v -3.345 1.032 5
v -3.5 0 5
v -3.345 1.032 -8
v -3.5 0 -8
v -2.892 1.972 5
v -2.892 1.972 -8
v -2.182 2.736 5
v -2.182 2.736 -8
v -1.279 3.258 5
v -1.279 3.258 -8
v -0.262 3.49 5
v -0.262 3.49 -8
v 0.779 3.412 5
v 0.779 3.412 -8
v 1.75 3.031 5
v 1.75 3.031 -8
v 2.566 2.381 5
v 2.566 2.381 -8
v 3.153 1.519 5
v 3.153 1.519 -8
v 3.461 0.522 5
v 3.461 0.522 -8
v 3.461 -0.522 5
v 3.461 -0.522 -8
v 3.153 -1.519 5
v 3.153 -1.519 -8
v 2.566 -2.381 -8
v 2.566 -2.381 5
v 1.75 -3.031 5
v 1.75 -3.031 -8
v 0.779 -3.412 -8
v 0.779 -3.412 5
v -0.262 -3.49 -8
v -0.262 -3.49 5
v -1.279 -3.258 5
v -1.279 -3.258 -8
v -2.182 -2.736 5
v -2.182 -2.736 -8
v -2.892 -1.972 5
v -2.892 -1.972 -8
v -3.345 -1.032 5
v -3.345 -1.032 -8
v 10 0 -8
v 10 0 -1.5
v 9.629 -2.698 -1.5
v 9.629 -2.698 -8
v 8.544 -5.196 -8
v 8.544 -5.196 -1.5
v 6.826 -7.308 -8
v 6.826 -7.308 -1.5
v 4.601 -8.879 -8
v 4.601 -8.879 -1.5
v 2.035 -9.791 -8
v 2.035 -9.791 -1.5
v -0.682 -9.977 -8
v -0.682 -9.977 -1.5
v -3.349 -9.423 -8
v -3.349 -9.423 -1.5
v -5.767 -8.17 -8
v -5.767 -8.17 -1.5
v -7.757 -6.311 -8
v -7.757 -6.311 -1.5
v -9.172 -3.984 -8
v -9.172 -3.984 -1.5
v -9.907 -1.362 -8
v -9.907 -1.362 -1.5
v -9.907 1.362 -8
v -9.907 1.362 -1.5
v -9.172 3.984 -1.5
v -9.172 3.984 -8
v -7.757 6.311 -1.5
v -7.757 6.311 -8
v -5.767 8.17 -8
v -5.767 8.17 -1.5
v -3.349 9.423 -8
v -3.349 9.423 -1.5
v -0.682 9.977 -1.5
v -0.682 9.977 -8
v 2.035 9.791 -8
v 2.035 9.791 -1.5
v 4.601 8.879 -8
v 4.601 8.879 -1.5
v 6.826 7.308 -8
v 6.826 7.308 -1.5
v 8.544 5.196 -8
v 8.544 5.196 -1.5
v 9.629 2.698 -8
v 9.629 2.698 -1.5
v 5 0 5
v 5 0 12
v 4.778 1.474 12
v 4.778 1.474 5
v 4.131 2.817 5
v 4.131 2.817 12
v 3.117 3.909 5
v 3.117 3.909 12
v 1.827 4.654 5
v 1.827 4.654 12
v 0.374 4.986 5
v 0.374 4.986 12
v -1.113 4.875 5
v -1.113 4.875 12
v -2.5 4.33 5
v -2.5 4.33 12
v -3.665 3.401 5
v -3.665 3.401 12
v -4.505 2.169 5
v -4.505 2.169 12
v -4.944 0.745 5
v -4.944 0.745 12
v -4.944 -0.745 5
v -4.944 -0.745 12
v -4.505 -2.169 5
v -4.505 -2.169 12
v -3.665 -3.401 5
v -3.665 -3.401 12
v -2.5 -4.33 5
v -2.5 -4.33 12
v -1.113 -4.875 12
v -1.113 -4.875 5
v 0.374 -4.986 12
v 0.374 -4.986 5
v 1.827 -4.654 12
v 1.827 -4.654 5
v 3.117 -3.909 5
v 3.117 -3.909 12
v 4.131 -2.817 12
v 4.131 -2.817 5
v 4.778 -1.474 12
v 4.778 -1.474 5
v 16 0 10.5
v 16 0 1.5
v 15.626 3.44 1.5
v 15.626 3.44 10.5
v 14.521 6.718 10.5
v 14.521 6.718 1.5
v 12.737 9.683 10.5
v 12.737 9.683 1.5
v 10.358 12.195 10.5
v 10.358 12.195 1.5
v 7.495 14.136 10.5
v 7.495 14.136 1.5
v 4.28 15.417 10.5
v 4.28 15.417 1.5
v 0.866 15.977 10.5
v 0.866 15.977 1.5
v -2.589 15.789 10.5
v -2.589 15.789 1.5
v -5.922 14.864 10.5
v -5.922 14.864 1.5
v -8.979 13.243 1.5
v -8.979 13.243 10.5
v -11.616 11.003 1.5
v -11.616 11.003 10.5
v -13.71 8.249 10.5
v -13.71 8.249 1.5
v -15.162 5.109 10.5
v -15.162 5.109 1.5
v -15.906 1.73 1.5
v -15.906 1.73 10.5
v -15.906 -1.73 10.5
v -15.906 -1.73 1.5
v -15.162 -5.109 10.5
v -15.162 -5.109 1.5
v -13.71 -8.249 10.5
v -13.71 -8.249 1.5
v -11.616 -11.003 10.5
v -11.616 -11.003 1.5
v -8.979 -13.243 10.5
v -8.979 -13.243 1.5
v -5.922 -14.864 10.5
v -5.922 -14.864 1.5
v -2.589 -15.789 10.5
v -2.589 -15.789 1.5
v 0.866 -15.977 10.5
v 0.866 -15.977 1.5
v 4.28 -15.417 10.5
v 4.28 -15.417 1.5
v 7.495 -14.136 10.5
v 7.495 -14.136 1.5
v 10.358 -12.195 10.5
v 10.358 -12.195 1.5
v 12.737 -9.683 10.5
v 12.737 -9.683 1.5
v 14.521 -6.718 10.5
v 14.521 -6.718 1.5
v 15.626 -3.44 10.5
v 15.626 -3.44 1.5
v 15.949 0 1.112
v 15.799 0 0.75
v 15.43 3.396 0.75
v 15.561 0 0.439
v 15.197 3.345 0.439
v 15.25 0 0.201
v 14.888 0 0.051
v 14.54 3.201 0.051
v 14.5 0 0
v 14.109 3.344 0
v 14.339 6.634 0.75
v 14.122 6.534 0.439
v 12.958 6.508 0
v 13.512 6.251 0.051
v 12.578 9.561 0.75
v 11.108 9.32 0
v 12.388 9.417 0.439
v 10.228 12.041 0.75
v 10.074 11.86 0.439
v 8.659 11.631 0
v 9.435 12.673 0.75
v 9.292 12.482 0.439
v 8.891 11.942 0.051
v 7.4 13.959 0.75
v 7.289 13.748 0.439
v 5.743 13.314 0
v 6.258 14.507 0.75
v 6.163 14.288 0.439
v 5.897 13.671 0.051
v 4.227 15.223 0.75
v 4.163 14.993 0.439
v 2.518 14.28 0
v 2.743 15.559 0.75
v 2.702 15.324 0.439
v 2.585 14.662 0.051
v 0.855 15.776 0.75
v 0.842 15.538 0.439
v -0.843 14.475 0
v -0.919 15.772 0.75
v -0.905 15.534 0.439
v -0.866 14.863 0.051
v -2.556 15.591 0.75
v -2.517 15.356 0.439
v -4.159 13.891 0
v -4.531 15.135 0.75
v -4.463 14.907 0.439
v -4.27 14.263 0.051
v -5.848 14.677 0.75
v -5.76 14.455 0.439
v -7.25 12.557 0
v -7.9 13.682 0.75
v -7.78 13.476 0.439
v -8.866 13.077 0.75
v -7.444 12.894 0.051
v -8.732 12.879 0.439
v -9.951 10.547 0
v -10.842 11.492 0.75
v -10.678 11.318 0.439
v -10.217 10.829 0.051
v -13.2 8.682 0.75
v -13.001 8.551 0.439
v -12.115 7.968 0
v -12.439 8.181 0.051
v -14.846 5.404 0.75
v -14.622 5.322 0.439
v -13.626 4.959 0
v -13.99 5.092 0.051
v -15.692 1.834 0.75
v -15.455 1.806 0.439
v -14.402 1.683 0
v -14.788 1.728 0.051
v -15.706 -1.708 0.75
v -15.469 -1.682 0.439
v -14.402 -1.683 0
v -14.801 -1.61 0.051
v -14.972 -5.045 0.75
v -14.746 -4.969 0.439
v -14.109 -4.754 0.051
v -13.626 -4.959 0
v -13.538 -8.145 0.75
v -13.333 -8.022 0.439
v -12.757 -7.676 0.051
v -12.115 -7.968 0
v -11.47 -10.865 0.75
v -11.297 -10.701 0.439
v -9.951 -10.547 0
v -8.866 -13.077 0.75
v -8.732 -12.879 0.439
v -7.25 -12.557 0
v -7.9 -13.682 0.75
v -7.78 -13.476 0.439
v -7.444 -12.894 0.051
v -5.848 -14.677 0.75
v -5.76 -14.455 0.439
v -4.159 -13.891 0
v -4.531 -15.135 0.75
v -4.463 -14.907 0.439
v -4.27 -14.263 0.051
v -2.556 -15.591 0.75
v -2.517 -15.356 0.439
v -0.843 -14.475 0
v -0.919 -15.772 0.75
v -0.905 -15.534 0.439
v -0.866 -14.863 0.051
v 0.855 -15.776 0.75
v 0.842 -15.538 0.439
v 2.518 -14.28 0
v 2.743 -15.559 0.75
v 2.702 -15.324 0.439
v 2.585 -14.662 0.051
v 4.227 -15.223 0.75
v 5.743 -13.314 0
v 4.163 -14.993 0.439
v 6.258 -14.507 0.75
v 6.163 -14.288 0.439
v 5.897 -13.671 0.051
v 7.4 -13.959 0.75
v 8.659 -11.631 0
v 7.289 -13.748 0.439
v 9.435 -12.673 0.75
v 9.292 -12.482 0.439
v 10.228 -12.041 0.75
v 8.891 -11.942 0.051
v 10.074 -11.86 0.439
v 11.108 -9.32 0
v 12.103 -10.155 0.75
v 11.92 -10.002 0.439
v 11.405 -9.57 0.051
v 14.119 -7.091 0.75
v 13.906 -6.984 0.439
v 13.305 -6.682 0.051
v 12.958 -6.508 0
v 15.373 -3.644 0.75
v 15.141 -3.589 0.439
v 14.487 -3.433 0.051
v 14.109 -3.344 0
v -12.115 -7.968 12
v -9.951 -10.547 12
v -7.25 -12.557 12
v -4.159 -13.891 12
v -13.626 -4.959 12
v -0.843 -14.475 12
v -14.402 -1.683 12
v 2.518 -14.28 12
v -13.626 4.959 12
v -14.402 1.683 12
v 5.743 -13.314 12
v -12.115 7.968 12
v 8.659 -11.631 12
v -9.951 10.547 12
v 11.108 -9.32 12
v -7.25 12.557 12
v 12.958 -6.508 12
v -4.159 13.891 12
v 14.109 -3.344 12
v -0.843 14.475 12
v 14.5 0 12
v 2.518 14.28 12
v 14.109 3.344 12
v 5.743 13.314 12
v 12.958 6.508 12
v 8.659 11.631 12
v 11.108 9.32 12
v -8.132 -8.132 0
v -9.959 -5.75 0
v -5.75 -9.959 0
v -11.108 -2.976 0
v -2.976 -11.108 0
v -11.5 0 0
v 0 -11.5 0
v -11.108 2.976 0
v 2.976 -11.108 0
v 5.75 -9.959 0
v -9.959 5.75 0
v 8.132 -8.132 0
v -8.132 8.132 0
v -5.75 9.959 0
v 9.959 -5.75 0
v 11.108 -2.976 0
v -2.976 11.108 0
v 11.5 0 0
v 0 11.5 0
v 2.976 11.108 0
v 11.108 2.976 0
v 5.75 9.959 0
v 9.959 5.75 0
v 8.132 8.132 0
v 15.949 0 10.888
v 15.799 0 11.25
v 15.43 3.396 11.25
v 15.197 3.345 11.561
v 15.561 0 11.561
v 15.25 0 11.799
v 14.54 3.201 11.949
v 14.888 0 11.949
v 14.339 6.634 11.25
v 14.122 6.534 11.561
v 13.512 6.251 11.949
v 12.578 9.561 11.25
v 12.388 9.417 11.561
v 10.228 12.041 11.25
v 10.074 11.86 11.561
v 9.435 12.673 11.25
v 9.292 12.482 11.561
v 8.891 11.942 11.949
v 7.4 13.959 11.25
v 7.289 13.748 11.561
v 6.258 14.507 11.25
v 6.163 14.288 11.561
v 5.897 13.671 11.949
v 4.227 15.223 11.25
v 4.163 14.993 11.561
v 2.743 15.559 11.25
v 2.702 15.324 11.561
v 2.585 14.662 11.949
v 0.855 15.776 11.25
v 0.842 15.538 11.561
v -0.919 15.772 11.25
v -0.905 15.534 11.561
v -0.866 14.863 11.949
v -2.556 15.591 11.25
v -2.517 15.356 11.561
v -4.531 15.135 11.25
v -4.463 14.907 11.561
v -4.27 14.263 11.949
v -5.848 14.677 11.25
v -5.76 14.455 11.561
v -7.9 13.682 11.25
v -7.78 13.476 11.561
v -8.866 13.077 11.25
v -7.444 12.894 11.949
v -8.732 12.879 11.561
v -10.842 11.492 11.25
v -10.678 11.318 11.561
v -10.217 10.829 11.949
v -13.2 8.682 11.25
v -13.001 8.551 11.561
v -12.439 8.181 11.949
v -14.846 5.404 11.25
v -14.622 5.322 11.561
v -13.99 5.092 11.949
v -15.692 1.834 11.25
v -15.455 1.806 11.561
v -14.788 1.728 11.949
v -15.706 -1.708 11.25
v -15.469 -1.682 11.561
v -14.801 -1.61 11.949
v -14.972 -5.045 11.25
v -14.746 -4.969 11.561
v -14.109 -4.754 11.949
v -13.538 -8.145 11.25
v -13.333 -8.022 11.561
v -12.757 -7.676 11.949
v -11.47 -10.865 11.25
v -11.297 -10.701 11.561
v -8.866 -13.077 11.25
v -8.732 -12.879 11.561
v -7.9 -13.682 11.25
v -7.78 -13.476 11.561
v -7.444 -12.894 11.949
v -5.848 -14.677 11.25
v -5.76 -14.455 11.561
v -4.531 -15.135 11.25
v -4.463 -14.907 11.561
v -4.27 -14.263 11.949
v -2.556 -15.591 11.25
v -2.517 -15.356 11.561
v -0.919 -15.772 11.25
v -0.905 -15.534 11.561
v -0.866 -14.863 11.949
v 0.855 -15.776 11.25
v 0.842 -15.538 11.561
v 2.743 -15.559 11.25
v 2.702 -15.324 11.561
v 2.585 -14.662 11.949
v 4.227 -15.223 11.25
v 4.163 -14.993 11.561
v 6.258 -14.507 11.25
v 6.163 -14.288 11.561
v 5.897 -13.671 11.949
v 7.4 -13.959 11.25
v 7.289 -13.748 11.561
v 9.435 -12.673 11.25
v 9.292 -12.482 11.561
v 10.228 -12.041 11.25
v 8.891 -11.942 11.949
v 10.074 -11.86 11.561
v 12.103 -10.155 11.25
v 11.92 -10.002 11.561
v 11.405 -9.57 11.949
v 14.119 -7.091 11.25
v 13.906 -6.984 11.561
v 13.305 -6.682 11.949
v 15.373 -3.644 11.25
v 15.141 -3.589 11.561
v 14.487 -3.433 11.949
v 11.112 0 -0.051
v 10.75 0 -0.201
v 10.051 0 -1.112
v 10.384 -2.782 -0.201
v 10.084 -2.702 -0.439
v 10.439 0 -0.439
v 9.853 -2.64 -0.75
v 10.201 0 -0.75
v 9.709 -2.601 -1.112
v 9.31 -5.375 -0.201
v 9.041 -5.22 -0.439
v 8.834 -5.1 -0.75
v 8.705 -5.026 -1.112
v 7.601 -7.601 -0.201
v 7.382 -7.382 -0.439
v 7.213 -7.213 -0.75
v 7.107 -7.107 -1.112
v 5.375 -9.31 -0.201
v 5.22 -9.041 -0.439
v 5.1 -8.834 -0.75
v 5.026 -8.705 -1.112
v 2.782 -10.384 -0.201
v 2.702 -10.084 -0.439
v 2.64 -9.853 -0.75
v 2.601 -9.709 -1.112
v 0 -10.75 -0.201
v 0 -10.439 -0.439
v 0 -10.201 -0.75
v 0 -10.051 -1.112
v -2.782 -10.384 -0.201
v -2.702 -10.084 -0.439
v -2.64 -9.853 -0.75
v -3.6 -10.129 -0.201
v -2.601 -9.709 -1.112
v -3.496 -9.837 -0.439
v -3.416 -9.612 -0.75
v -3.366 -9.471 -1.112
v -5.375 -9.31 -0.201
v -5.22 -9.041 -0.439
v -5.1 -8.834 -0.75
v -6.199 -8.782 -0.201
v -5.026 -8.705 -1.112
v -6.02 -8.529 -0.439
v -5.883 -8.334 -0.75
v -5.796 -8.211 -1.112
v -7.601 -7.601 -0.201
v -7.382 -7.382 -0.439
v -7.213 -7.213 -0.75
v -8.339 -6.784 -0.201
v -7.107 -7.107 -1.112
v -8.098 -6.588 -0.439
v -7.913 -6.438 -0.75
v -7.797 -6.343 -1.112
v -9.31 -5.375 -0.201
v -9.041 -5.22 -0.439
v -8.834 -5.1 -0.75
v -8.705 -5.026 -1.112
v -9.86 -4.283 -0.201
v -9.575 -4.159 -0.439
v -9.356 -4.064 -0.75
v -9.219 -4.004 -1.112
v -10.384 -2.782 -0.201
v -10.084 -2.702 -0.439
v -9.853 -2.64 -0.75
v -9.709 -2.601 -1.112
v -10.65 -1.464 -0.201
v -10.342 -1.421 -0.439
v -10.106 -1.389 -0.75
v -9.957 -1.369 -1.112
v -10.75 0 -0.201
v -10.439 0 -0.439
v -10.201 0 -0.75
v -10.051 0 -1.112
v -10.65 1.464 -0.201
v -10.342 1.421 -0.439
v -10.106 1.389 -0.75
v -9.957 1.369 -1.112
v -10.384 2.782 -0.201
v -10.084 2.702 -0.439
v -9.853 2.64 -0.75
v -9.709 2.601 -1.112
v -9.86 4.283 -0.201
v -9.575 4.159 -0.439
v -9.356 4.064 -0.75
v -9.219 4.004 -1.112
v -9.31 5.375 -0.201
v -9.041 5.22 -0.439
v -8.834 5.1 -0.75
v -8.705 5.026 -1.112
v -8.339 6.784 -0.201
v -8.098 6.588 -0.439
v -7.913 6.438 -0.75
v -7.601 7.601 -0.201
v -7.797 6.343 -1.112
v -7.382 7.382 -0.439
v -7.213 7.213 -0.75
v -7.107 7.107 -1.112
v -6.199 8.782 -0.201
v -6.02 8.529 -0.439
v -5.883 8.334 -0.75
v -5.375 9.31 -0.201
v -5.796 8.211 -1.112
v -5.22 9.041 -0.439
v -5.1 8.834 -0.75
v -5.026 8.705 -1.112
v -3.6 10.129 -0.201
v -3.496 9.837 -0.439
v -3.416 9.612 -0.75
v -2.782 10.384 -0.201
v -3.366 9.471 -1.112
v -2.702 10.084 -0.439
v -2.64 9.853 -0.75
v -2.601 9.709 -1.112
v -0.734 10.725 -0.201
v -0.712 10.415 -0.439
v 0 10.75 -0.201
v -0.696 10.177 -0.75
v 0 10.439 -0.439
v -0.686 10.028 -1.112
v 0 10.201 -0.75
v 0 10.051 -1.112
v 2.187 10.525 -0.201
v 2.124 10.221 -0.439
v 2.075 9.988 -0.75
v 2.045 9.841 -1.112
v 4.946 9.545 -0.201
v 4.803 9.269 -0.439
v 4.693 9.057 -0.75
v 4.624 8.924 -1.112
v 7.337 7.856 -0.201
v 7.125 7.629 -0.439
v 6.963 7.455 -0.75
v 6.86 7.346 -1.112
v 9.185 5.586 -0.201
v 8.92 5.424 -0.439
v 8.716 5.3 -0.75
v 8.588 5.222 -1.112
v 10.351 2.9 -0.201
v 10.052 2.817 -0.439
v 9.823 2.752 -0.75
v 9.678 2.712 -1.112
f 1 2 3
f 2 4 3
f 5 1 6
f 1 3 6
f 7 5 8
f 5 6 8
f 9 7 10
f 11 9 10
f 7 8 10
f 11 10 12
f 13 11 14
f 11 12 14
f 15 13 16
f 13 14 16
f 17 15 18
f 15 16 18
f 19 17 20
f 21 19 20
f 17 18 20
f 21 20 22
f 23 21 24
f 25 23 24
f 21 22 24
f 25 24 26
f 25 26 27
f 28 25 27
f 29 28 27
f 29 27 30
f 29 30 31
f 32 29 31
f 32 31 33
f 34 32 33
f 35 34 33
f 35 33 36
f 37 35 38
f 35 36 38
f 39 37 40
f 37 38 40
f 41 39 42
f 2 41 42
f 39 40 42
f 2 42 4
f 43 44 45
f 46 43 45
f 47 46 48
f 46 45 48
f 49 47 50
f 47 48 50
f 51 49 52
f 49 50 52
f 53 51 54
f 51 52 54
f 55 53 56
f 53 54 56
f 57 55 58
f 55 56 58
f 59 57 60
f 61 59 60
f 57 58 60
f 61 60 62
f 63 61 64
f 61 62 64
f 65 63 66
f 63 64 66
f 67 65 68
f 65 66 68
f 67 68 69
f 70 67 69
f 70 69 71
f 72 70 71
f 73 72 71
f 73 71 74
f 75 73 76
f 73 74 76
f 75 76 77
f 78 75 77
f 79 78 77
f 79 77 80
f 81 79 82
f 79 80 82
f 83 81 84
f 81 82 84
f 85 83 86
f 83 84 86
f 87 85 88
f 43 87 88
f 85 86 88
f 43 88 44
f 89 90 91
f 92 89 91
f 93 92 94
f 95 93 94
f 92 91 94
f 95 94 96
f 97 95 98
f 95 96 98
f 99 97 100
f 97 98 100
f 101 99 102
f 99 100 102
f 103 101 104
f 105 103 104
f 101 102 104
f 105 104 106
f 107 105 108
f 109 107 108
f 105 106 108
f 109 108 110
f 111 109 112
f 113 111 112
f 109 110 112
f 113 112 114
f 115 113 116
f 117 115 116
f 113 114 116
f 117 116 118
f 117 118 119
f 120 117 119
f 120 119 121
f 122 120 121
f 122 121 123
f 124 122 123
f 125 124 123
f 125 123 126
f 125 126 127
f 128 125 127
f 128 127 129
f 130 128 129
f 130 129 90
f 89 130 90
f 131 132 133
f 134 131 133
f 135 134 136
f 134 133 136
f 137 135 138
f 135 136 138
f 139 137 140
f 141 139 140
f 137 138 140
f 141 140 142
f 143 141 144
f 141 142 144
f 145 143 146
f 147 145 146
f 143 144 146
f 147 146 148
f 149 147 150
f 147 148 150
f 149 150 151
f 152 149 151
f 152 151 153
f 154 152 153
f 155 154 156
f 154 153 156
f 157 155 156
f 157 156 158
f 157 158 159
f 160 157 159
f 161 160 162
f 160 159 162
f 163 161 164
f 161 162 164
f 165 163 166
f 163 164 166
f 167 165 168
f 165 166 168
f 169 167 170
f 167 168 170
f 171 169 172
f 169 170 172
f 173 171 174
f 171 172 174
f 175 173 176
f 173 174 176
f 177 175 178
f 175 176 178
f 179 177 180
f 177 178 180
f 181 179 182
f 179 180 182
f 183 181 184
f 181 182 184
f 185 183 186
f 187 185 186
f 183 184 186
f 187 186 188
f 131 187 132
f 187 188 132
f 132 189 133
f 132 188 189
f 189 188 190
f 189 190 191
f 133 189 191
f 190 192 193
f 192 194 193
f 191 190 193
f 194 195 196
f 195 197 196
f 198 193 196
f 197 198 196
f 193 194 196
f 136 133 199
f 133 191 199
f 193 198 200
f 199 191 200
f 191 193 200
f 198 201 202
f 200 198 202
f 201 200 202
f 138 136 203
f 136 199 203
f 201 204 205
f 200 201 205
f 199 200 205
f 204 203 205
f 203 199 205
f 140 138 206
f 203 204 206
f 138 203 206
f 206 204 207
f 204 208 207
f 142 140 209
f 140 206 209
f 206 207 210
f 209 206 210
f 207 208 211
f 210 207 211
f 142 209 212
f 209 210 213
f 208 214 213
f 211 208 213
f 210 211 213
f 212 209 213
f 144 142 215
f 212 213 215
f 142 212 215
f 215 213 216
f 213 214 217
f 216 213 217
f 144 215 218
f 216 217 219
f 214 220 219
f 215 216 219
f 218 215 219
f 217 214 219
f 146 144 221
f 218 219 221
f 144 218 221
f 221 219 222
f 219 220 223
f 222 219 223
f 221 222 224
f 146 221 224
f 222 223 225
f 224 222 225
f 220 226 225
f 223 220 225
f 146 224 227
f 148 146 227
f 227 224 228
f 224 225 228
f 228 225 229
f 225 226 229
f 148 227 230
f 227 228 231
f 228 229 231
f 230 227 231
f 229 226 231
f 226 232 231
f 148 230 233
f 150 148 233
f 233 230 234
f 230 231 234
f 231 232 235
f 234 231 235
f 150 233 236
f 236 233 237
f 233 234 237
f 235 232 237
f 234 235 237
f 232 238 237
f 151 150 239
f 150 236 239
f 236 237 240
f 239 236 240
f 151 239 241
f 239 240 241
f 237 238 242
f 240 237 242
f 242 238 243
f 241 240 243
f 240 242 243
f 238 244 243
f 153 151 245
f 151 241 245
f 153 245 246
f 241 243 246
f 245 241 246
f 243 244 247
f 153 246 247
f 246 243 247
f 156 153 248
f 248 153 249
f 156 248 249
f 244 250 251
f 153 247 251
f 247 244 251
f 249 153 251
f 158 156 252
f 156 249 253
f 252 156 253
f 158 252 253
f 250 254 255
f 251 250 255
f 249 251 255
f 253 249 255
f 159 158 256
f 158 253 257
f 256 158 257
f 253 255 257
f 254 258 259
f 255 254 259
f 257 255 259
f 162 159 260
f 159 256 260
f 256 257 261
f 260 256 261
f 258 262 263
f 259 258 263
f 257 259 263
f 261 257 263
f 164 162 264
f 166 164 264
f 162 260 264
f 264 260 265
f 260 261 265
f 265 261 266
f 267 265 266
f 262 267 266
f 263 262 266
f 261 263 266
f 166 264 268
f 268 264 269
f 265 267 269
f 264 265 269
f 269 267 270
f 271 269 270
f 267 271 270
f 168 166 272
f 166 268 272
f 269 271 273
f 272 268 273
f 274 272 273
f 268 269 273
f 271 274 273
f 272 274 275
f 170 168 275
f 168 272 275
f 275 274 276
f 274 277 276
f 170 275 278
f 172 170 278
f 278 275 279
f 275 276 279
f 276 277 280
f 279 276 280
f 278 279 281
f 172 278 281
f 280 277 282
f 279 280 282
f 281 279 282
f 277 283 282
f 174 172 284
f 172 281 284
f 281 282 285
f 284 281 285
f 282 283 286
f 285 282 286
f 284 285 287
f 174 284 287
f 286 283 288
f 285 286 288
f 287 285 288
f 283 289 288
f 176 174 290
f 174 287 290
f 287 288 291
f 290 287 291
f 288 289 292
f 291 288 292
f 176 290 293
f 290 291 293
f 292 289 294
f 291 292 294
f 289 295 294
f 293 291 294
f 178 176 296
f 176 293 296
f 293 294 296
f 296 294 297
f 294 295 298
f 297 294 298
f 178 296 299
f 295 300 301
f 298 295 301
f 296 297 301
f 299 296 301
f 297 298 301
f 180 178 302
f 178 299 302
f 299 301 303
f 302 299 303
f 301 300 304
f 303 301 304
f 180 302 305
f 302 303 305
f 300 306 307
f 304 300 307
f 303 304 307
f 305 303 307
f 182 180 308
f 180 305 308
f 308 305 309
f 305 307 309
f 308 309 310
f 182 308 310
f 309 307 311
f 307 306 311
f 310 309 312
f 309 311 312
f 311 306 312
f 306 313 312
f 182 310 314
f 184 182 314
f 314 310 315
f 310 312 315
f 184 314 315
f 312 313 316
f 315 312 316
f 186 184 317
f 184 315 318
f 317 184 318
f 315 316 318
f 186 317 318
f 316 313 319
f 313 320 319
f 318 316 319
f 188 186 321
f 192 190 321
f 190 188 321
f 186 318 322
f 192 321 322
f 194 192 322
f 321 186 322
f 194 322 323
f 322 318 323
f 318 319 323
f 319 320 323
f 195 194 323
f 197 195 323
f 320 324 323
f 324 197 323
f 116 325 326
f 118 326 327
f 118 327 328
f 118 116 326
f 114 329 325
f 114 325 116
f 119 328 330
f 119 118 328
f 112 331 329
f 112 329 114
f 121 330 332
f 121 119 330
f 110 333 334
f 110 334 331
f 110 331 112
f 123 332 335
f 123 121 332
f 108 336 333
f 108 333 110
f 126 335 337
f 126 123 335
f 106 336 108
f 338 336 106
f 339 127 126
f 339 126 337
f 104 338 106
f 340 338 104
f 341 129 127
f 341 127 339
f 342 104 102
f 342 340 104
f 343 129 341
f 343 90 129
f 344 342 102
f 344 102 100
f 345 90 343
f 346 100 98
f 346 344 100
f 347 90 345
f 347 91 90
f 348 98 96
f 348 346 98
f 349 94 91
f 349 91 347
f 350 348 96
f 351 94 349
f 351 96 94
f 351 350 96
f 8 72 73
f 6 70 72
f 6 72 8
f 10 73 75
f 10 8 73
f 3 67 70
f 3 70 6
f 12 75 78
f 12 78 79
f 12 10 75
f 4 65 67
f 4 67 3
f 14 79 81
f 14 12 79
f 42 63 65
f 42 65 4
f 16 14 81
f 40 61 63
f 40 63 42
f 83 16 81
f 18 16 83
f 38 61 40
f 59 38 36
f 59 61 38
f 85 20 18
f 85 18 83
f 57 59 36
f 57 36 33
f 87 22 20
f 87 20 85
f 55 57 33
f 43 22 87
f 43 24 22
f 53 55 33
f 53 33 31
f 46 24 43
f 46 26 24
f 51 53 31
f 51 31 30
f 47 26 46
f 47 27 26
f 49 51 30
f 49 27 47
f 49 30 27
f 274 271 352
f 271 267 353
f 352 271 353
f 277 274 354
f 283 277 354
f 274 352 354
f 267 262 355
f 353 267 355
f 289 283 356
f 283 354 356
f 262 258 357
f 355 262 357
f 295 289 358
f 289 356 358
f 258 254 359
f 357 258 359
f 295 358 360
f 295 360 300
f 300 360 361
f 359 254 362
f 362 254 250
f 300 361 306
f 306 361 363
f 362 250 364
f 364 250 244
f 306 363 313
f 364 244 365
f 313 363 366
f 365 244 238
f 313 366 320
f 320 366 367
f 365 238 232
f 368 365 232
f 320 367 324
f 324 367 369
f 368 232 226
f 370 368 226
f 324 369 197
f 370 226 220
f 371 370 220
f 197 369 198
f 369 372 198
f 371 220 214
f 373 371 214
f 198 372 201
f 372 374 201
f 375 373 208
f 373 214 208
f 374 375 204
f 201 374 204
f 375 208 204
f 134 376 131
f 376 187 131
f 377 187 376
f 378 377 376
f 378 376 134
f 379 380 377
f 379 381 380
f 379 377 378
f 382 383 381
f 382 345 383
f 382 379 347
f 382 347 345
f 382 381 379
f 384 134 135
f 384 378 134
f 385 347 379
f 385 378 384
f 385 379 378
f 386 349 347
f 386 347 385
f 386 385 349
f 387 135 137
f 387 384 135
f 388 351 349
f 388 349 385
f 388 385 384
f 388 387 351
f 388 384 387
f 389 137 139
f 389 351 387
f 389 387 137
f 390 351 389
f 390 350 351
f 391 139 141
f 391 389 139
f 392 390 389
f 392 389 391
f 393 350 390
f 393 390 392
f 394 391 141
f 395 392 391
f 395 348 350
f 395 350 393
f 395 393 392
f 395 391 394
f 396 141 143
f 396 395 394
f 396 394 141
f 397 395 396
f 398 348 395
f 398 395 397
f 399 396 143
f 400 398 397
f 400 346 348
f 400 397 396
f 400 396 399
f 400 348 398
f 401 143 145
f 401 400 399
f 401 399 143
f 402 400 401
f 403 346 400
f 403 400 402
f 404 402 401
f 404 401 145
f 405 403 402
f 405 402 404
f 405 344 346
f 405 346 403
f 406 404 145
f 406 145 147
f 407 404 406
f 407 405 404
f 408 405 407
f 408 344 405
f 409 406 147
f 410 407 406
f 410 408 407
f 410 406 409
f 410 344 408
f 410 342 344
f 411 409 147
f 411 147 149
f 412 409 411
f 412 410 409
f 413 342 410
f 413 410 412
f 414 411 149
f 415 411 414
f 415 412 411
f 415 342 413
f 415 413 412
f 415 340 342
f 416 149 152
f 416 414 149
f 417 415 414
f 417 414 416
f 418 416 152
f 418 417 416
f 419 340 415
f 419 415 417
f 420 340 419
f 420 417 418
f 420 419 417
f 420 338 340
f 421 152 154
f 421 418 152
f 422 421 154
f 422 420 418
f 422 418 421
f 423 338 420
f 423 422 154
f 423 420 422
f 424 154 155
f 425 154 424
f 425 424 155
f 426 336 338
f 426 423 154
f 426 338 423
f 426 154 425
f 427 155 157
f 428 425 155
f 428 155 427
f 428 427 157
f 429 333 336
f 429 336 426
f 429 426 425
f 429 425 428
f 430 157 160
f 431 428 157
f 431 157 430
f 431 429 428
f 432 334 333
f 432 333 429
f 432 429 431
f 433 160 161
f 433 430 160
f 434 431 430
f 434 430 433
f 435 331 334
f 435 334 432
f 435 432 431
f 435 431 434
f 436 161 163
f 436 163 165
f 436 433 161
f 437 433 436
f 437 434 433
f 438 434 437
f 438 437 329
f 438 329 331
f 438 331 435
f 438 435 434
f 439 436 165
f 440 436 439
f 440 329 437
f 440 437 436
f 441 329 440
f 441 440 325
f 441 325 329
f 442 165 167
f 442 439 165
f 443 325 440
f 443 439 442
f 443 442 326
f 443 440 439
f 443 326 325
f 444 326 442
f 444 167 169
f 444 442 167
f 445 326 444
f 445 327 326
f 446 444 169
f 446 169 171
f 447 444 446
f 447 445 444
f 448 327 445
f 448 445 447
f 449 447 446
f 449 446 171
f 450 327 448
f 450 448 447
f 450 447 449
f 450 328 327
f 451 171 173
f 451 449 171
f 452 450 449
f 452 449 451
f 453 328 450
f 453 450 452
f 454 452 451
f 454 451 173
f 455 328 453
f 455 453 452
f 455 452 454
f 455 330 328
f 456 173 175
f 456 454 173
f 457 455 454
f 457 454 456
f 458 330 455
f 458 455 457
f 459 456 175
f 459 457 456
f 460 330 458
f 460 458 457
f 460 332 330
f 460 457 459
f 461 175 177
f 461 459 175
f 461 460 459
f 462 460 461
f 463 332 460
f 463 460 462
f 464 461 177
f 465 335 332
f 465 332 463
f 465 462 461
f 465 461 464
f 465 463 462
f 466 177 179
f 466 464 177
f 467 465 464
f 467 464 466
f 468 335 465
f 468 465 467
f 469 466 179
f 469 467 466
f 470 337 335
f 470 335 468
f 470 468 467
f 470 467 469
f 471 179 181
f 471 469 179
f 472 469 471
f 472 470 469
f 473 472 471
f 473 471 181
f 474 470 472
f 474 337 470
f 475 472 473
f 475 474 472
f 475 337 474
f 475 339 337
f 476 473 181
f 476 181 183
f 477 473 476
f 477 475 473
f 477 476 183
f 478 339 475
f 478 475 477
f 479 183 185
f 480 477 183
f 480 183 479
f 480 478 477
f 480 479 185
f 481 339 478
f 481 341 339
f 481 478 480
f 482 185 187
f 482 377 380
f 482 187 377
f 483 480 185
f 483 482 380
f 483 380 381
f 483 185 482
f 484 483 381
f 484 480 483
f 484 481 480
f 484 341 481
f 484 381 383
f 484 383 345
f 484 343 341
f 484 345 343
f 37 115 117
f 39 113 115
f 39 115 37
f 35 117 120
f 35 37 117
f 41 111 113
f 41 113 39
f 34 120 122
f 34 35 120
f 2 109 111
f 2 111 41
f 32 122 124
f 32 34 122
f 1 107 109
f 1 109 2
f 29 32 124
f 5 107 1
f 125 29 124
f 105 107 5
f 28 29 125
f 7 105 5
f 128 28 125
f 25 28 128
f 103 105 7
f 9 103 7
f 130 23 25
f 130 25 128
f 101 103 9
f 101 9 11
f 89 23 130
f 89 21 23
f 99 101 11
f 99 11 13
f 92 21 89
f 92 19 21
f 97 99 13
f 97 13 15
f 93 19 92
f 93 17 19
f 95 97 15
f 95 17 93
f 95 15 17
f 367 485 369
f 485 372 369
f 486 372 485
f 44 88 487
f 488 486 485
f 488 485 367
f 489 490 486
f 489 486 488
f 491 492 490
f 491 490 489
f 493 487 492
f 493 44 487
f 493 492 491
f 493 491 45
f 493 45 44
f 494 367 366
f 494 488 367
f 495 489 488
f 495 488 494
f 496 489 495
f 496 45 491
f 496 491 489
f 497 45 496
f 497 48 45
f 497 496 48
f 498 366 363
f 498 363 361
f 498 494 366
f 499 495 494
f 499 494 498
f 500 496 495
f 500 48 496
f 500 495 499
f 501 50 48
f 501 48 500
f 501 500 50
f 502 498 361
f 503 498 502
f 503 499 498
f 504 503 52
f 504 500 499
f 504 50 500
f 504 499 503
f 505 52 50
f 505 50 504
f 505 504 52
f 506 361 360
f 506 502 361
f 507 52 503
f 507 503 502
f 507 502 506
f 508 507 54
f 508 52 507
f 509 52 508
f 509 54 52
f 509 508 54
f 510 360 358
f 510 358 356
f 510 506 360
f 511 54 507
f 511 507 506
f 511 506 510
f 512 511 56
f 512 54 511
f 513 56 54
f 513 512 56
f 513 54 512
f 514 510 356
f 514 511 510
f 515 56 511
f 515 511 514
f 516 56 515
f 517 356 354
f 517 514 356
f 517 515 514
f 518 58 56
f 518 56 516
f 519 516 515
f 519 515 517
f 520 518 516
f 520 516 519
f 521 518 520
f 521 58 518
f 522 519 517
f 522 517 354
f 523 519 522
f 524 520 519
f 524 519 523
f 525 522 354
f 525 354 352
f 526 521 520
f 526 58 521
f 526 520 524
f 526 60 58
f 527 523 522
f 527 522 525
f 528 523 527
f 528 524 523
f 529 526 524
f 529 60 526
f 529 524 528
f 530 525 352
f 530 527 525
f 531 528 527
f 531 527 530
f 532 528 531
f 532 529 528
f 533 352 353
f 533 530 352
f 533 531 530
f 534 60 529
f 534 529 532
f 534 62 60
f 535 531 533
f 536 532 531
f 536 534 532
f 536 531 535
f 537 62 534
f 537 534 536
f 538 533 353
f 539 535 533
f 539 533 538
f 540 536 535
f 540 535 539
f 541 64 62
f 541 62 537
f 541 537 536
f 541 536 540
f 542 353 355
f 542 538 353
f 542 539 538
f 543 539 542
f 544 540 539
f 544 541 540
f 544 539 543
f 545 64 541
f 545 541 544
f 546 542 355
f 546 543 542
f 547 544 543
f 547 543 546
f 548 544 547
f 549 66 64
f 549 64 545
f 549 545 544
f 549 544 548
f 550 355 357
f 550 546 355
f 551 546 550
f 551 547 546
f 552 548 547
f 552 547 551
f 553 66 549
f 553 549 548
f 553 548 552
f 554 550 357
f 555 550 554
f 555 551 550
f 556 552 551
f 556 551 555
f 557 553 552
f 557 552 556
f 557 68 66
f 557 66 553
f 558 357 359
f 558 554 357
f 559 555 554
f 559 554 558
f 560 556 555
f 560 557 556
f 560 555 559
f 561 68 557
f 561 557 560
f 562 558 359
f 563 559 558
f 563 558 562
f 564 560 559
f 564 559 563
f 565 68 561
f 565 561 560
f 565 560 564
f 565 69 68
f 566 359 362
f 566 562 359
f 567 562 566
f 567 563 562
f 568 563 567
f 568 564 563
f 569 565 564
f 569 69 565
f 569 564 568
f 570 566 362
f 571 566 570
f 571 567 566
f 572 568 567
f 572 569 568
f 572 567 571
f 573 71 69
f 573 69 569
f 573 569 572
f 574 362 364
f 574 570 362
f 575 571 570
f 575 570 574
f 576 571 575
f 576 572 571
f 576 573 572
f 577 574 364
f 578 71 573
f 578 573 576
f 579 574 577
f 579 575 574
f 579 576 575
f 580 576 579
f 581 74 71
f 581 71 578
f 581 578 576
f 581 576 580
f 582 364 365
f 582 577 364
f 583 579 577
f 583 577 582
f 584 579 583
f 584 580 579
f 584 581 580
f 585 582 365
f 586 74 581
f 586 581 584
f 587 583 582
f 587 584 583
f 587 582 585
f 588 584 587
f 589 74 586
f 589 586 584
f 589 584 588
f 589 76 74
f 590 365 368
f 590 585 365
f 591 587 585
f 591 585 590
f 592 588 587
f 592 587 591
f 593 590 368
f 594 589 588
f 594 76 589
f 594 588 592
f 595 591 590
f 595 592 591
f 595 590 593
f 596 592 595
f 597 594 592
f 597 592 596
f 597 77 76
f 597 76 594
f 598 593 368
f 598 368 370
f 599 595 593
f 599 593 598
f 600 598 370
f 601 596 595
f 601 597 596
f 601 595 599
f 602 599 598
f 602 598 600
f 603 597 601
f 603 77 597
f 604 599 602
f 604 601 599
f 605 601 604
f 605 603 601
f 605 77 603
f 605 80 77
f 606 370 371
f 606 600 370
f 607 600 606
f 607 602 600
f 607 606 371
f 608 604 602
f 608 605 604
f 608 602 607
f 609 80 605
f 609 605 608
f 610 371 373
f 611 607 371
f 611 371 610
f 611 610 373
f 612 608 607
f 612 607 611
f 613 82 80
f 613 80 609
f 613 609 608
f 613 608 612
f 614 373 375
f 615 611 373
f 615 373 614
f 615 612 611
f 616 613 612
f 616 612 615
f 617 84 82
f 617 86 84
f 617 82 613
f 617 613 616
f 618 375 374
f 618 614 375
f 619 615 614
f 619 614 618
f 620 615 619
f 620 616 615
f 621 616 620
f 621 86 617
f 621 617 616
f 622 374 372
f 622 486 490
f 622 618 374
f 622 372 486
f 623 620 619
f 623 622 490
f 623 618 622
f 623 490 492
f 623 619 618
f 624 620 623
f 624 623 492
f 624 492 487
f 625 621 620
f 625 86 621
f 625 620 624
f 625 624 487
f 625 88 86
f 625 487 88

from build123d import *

# Parameters (mm, degrees)
F0_R           = 16
F1_DEPTH       = 12
F2_R           = 10
F3_DEPTH       = 8
F5_D           = 7
F5_CBORE_D     = 10
F5_CBORE_DEPTH = 7
F6_R           = 1.5


with BuildPart() as f1:
    # F0 (on Top) → F1 (new body)
    with BuildSketch(Plane.XY):
        Circle(F0_R)
    extrude(amount=F1_DEPTH)

    # F2 (on face) → F3 (join)
    with BuildSketch(Plane(origin=(0, 0, 0), x_dir=(1, 0, 0), z_dir=(0, 0, -1))):
        Circle(F2_R)
    extrude(amount=F3_DEPTH)

    # F5 (through all)
    with Locations(Plane.XY.offset(12)):
        with Locations((0, 0)):
            CounterBoreHole(F5_D / 2, F5_CBORE_D / 2, F5_CBORE_DEPTH)

    # F6
    f6_edges = [f1.edges().sort_by_distance(p)[0] for p in [
        (-16, 0, 12),
        (-16, 0, 0),
        (-10, 0, 0),
    ]]
    fillet(f6_edges, radius=F6_R)


solid = f1.part
